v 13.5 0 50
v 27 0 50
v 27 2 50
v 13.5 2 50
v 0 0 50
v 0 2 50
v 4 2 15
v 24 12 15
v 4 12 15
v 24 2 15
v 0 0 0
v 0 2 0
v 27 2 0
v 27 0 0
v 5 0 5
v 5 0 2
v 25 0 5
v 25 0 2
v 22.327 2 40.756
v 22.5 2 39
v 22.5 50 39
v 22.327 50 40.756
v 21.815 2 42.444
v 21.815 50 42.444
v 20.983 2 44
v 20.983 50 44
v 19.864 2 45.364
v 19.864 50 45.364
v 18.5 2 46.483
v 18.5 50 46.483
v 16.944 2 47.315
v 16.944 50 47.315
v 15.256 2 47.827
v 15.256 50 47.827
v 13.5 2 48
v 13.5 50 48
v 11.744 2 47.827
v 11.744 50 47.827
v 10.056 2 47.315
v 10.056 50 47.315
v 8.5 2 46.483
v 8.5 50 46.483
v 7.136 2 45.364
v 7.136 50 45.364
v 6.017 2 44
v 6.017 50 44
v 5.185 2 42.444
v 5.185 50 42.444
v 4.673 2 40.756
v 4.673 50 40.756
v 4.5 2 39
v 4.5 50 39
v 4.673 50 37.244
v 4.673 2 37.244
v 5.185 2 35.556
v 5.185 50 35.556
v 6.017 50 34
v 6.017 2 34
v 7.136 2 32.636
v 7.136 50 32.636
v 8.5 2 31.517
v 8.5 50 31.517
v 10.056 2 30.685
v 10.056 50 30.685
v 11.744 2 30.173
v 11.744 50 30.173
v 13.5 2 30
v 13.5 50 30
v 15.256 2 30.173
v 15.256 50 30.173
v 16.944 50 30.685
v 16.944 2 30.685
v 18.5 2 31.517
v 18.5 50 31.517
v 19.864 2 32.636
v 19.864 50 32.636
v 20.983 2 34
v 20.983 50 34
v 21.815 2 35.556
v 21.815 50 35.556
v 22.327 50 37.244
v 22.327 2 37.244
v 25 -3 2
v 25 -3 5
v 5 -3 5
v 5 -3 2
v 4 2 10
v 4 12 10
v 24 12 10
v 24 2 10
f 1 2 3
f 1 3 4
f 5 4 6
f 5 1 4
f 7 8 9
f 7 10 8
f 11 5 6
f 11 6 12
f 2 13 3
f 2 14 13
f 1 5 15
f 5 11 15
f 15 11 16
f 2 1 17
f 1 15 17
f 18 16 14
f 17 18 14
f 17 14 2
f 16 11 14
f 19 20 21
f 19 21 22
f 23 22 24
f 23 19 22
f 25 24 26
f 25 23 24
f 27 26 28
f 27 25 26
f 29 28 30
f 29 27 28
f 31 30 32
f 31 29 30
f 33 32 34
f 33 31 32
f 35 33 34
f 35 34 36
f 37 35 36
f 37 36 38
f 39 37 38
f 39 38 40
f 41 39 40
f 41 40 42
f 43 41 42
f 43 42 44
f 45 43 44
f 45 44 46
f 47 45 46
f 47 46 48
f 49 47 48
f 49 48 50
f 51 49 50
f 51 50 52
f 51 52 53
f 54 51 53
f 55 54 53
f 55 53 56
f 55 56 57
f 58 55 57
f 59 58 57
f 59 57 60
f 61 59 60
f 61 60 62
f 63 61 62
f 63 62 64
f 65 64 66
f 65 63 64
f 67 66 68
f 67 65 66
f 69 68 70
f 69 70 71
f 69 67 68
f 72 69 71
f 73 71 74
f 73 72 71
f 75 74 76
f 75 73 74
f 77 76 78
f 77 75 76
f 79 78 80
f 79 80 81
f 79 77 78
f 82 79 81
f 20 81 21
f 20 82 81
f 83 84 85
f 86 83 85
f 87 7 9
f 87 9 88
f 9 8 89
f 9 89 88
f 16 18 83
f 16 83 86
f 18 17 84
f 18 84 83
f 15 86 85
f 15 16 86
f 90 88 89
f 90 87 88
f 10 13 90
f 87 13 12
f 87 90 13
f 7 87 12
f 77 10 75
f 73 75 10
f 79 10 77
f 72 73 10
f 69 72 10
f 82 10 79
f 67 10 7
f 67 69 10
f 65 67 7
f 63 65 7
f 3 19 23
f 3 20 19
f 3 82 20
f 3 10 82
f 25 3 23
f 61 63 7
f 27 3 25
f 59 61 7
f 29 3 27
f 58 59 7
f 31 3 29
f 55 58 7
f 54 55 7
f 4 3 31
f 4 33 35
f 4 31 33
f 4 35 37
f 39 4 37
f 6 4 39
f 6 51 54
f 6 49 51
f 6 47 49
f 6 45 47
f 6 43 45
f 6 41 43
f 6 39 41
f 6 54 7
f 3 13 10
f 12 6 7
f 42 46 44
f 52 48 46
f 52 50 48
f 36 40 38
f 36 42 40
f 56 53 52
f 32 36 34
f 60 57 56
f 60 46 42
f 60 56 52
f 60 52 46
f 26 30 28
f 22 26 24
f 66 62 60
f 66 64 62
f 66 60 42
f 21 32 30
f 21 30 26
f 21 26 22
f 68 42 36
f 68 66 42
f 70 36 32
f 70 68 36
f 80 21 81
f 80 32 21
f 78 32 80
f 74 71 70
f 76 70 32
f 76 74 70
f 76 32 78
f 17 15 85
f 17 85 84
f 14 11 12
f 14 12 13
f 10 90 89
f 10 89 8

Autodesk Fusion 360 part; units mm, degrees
sketch "Skizze1" plane through (0, 0, 0) normal (0, 1, 0) x (1, 0, 0)
  line L0 (0, 0) -> (27, 0)
  line L1 (27, 0) -> (27, -50)
  line L2 (27, -50) -> (0, -50)
  line L3 (0, -50) -> (0, 0)
  line L4 (13.5, -50) -> (13.5, -39)
  circle A0 centre (13.5, -39) radius 9
  dimension "d1" = 50
  dimension "d2" = 27
  dimension "d3" = 11
  dimension "d4" = 18
extrude "Extrusion1" add sketch "Skizze1" along normal blind 50 contours A0 makes body 1
extrude "Extrusion2" add sketch "Skizze1" along normal blind 2 bodies 1
sketch "Skizze2" plane through (0, 2, 0) normal (0, 1, 0) x (-1, 0, 0)
  circle A0 centre (-13.5, 39) radius 9
  line L0 (0, 50) -> (-27, 50)
  line L1 (-27, 50) -> (-27, 0)
  line L2 (-27, 0) -> (0, 0)
  line L3 (0, 0) -> (0, 50)
  line L4 (0, 0) -> (-4, 0)
  line L5 (-4, 0) -> (-4, 10)
  line L6 (-4, 10) -> (0, 10)
  line L7 (0, 10) -> (0, 0)
  line L8 (-4, 10) -> (-24, 10)
  line L9 (-24, 10) -> (-24, 15)
  line L10 (-24, 15) -> (-4, 15)
  line L11 (-4, 15) -> (-4, 10)
  dimension "d9" = 10
  dimension "d10" = 4
  dimension "d11" = 20
  dimension "d12" = 5
extrude "Extrusion3" add sketch "Skizze2" along normal blind 10 contours L8 L9 L10 L11 bodies 1
sketch "Skizze3" plane through (0, 2, 0) normal (0, 1, 0) x (-1, 0, 0)
  line L0 (-4, 15) -> (-4, 10)
  line L1 (-4, 10) -> (-24, 10)
  line L2 (-24, 10) -> (-24, 15)
  line L3 (-24, 15) -> (-4, 15)
  circle A0 centre (-13.5, 39) radius 9
  line L4 (0, 50) -> (-27, 50)
  line L5 (-27, 50) -> (-27, 0)
  line L6 (-27, 0) -> (0, 0)
  line L7 (0, 0) -> (0, 50)
  line L8 (-5, 5) -> (-25, 5)
  line L9 (-25, 5) -> (-25, 2)
  line L10 (-25, 2) -> (-5, 2)
  line L11 (-5, 2) -> (-5, 5)
  dimension "d15" = 20
  dimension "d16" = 3
extrude "Extrusion4" add sketch "Skizze3" against normal blind 5 contours L8 L9 L10 L11 bodies 1
copy_body "Körper->Berechn1" bodies 1 removing the originals makes body 2 in component "nixie_modul"
component "nixie_modul" placed x (1, 0, 0) y (0, 1, 0) z (0, 0, 1) at (0, 0, 0)
